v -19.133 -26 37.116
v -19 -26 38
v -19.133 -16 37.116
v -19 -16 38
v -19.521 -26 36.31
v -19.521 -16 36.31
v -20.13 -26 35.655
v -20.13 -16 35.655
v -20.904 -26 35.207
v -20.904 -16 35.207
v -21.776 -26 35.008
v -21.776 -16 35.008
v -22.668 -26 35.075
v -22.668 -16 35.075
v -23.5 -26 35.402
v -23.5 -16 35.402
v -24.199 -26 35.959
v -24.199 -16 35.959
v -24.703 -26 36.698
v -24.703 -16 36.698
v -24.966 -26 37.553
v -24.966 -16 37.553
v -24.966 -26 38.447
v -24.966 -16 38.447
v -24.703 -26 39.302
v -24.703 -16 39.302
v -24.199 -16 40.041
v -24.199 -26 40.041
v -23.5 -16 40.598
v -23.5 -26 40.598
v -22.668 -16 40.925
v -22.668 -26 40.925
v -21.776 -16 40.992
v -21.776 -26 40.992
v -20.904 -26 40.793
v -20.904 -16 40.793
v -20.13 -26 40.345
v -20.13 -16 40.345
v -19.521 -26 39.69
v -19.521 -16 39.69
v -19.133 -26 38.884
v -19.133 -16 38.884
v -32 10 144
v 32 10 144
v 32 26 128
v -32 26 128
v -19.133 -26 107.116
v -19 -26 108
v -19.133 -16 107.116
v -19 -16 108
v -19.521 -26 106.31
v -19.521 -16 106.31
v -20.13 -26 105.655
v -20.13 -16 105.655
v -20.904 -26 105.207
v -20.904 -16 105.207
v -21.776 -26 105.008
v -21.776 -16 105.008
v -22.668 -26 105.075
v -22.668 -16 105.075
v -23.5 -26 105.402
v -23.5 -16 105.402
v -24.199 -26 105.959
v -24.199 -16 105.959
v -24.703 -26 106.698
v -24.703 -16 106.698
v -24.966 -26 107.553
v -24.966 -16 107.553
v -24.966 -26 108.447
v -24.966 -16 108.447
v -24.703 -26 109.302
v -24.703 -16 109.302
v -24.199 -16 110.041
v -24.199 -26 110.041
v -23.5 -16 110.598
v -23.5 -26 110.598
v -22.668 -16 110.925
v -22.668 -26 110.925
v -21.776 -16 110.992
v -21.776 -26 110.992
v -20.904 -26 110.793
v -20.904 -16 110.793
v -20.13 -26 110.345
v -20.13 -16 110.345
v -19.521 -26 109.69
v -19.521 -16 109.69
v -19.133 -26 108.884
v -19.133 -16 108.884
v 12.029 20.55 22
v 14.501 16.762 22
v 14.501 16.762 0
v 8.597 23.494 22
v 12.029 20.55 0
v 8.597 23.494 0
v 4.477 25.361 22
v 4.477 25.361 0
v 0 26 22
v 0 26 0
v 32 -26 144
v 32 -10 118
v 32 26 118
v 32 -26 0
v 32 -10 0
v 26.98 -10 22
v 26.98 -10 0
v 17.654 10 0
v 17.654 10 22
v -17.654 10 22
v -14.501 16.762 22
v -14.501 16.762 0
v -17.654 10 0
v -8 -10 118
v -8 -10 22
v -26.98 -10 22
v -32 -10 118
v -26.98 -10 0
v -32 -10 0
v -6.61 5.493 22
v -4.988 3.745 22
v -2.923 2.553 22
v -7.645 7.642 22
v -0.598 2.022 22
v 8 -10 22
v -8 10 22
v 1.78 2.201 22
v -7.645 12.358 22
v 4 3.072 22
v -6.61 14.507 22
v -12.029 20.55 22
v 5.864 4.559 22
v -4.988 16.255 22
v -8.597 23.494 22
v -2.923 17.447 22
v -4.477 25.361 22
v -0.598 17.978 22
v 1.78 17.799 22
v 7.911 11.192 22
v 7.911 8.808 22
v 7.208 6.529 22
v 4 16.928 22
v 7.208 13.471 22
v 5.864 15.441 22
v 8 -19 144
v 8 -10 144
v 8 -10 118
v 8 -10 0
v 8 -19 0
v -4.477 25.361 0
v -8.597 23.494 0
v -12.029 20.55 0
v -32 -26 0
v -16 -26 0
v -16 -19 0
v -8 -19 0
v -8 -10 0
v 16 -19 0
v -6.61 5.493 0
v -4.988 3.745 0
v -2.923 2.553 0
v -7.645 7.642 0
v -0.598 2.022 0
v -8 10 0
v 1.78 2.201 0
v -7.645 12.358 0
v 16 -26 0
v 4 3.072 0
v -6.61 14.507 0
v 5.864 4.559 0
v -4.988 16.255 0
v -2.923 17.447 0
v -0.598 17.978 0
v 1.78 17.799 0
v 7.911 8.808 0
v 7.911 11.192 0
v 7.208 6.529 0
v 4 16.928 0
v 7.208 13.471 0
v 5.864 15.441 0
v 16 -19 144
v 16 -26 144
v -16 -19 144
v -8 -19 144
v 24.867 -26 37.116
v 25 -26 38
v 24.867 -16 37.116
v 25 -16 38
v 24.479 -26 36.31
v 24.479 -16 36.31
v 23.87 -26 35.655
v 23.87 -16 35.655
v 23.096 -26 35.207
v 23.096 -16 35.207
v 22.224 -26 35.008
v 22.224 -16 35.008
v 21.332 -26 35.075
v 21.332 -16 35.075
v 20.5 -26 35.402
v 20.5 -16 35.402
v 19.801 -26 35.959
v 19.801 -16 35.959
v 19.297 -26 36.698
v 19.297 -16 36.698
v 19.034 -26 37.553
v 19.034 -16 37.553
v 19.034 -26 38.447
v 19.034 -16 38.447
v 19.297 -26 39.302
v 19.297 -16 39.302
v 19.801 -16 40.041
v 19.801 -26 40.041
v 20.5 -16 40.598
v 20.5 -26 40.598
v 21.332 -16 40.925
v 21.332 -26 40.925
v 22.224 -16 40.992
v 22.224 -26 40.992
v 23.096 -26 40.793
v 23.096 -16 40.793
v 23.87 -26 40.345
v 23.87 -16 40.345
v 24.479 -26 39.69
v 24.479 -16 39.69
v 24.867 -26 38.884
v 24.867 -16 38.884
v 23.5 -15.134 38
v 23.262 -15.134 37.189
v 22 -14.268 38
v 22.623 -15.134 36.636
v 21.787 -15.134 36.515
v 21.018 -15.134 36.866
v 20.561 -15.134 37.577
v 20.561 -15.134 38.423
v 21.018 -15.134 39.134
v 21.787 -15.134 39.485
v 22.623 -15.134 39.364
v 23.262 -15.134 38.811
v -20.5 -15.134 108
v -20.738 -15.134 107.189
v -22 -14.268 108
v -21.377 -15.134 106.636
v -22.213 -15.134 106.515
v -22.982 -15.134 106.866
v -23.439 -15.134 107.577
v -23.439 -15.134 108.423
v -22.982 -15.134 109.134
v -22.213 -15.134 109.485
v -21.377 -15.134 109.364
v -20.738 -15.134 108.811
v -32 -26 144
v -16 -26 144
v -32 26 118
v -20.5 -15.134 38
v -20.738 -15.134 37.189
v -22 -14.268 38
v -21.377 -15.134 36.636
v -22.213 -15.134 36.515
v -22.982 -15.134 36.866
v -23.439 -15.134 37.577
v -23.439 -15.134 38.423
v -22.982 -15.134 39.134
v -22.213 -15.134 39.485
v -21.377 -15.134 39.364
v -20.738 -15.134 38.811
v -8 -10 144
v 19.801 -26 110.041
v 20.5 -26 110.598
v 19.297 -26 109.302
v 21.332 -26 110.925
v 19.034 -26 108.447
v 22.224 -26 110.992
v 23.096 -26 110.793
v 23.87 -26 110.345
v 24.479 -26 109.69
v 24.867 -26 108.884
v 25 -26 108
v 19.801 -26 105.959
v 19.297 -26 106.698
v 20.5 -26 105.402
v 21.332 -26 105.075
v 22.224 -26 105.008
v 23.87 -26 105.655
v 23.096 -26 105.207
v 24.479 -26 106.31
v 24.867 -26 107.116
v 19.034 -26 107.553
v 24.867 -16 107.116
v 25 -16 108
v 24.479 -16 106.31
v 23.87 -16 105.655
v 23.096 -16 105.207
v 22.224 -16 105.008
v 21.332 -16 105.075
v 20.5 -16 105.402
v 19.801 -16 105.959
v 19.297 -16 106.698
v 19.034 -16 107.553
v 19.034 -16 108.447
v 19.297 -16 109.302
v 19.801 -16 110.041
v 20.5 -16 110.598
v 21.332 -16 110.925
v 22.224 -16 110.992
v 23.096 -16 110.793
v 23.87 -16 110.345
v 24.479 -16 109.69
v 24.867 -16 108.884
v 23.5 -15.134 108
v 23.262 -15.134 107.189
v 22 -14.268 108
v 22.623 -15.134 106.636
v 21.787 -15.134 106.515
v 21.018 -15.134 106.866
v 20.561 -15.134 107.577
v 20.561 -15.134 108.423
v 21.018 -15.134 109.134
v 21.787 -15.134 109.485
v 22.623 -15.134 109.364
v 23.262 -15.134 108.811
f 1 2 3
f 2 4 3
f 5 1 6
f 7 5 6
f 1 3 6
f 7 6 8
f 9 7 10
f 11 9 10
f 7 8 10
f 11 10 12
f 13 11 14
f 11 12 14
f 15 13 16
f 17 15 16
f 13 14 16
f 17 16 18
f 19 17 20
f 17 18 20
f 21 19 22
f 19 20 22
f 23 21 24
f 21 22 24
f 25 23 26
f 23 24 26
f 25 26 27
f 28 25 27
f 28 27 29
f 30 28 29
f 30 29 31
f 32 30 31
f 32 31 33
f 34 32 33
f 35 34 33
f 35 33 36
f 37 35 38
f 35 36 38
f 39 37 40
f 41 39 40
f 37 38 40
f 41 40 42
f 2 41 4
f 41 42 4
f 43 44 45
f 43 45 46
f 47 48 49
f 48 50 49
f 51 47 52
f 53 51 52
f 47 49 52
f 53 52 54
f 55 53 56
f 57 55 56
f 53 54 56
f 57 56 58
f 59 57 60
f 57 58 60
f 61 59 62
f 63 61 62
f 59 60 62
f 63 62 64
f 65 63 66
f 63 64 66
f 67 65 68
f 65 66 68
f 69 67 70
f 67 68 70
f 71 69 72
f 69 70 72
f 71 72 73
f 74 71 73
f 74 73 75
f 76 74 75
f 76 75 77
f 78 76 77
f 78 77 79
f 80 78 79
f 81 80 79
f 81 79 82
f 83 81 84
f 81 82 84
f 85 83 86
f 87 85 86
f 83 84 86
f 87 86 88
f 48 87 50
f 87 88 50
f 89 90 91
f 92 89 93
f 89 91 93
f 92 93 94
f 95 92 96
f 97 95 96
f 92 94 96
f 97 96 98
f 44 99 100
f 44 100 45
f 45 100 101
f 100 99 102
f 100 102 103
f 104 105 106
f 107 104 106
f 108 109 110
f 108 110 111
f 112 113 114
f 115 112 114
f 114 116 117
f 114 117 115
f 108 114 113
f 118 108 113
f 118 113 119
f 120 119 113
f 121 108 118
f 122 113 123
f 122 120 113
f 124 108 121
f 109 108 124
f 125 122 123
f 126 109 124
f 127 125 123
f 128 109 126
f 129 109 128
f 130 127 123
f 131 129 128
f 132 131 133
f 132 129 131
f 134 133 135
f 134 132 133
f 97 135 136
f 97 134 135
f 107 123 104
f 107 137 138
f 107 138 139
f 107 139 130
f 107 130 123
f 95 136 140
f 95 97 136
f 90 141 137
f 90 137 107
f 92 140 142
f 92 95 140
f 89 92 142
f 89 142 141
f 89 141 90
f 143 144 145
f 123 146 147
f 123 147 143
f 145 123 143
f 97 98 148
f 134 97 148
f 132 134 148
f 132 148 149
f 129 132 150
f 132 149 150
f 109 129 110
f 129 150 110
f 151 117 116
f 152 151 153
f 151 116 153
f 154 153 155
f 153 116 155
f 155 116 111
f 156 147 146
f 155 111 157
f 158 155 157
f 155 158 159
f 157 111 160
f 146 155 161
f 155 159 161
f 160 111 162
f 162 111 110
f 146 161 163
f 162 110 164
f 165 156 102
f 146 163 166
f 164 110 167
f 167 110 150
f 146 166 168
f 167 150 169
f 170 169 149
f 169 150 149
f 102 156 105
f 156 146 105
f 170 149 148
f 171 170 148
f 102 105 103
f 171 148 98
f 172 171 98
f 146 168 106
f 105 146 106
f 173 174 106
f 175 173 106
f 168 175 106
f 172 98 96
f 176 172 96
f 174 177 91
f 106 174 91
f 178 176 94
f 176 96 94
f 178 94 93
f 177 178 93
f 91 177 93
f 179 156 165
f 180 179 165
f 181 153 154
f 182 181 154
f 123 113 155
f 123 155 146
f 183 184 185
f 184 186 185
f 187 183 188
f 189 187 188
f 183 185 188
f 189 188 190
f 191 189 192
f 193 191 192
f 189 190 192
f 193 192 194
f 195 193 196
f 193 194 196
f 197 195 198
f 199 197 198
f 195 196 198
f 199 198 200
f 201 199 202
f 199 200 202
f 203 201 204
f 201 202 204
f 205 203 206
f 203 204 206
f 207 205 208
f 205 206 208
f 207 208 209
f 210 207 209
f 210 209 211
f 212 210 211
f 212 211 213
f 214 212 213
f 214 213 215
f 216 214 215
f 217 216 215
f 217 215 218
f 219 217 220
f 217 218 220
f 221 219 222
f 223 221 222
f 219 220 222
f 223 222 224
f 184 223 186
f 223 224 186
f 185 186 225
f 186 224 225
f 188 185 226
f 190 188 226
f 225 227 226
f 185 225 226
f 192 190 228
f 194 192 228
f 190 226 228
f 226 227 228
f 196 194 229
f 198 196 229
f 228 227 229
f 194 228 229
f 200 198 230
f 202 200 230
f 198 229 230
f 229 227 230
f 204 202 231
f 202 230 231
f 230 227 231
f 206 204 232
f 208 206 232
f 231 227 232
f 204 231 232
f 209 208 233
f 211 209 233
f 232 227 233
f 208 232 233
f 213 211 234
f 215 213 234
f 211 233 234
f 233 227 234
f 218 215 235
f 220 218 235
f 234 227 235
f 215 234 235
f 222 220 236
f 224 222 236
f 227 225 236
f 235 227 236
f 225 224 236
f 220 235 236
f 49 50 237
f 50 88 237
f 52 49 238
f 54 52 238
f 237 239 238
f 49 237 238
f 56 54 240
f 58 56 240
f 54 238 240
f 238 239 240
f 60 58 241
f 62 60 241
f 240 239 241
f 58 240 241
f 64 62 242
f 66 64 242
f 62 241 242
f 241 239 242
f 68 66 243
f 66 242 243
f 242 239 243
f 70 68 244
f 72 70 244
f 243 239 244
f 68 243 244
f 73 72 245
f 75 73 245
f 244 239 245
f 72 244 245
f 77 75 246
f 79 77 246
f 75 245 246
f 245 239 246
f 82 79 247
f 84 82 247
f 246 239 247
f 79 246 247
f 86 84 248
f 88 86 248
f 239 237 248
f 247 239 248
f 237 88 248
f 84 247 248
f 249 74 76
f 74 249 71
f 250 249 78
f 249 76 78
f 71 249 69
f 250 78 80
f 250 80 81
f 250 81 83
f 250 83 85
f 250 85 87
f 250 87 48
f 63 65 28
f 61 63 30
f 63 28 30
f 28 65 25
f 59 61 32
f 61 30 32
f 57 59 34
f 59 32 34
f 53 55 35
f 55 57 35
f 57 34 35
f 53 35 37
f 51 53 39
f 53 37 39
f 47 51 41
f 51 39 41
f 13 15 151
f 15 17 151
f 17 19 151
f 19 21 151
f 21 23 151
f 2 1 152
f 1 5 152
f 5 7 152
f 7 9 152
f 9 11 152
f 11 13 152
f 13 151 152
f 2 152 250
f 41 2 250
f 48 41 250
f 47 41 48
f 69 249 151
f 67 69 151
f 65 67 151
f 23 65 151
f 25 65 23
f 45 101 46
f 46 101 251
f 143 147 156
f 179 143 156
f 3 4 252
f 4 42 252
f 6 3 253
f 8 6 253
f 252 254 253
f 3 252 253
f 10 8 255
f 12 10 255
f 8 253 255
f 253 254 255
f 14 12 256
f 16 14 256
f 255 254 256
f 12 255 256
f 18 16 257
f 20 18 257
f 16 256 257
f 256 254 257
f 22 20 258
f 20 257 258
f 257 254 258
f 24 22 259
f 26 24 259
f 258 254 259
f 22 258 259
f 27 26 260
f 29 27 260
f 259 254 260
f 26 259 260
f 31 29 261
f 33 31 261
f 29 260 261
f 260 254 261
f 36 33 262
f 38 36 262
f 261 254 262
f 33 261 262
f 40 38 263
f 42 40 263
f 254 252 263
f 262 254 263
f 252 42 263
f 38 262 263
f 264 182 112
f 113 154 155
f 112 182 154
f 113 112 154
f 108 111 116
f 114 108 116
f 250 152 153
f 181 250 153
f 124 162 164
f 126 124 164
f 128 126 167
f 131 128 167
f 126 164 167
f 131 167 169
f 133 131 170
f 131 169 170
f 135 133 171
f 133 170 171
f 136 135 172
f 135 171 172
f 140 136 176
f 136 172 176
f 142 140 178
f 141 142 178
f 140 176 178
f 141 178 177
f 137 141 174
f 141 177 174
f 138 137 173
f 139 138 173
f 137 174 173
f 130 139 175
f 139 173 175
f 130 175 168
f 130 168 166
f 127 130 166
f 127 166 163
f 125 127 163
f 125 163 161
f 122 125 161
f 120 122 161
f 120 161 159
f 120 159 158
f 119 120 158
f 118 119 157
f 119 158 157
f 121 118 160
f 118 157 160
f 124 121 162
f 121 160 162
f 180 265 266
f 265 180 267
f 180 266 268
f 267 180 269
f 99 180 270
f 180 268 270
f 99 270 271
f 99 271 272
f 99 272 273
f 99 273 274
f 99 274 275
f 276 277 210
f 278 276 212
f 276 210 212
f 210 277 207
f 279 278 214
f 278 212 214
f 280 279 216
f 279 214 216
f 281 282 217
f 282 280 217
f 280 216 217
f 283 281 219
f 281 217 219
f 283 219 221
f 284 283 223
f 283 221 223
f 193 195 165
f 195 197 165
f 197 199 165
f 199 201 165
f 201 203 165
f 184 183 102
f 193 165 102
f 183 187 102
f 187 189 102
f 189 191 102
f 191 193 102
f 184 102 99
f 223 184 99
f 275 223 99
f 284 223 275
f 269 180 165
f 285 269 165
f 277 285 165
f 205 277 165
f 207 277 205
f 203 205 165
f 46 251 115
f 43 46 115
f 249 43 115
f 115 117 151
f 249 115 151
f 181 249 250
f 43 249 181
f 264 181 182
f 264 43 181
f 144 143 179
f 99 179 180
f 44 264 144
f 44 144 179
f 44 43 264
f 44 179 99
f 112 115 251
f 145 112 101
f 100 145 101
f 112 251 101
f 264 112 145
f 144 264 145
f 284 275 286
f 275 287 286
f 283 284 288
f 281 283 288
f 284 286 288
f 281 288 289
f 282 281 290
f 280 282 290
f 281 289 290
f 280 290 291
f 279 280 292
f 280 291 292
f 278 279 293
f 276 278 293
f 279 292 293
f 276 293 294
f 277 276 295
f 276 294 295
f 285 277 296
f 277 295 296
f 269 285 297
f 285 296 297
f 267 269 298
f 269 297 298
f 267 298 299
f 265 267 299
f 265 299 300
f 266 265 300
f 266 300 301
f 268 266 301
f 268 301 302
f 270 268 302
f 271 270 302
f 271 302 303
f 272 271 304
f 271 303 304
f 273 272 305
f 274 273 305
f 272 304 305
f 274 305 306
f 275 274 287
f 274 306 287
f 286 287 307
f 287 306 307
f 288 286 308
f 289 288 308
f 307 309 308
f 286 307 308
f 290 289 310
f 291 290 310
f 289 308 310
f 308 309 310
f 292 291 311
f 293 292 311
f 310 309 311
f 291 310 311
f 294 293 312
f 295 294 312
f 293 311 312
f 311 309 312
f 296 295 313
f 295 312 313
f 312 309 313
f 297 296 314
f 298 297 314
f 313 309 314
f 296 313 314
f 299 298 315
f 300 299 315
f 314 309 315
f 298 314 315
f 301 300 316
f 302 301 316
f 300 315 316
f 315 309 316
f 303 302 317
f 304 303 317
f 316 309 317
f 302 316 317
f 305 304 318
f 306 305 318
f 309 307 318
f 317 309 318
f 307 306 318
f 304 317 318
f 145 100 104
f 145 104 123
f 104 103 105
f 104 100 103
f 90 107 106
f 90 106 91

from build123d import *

# Parameters (mm, degrees)
BOSS_EXTRUDE2_DEPTH   = 144
BOSS_EXTRUDE2_2_DEPTH = 144
BOSS_EXTRUDE3_START   = 118
BOSS_EXTRUDE3_DEPTH   = 26
BOSS_EXTRUDE4_DEPTH   = 22
CHAMFER1_SIZE         = 16


# Read off the part's stored shape, not the designer's step: Ø2.0 (6) Diameter Hole1
with BuildPart() as part:
    # Sketch1 → Boss-Extrude2 (new body)
    with BuildSketch(Plane.XY):
        Polygon((26.980199866, -10), (8, -10), (8, -19), (16, -19), (16, -26), (32, -26), (32, -10), align=None)
    extrude(amount=BOSS_EXTRUDE2_DEPTH)



with BuildPart() as body_2:
    # Sketch1 → Boss-Extrude2 2 (new body)
    with BuildSketch(Plane.XY):
        Polygon((-32, -10), (-32, -26), (-16, -26), (-16, -19), (-8, -19), (-8, -10), (-26.980199866, -10), align=None)
    extrude(amount=BOSS_EXTRUDE2_2_DEPTH)


with BuildPart() as part_1:
    add(part.part)

    add(body_2.part)  # Boss-Extrude3 merges body 2
    # Sketch1<5> → Boss-Extrude3 (add)
    with BuildSketch(Plane.XY.offset(BOSS_EXTRUDE3_START)):
        Polygon((17.654046703, 10), (26.980199866, -10), (32, -10), (32, 10), align=None)
        with BuildLine():
            Line((32, 26), (-2.1e-08, 26))
            ThreePointArc((-2.1e-08, 26), (8.596793725, 23.494263139), (14.500924593, 16.761892188))
            Line((14.500924593, 16.761892188), (17.654046703, 10))
            Line((17.654046703, 10), (32, 10))
            Line((32, 10), (32, 26))
        make_face()
        with BuildLine():
            Line((-32, 26), (-32, 10))
            Line((-32, 10), (-17.654046703, 10))
            Line((-17.654046703, 10), (-14.500924593, 16.761892188))
            ThreePointArc((-14.500924593, 16.761892188), (-8.596793742, 23.494263127), (-2.1e-08, 26))
            Line((-2.1e-08, 26), (-32, 26))
        make_face()
        with BuildLine():
            Line((-14.500924593, 16.761892188), (-17.654046703, 10))
            Line((-17.654046703, 10), (-8, 10))
            ThreePointArc((-8, 10), (0, 18), (8, 10))
            Line((8, 10), (17.654046703, 10))
            Line((17.654046703, 10), (14.500924593, 16.761892188))
            ThreePointArc((14.500924593, 16.761892188), (8.596793725, 23.494263139), (-2.1e-08, 26))
            ThreePointArc((-2.1e-08, 26), (-8.596793742, 23.494263127), (-14.500924593, 16.761892188))
        make_face()
        with BuildLine():
            Line((-17.654046703, 10), (-26.980199866, -10))
            Line((-26.980199866, -10), (-8, -10))
            Line((-8, -10), (8, -10))
            Line((8, -10), (26.980199866, -10))
            Line((26.980199866, -10), (17.654046703, 10))
            Line((17.654046703, 10), (8, 10))
            ThreePointArc((8, 10), (0, 2), (-8, 10))
            Line((-8, 10), (-17.654046703, 10))
        make_face()
        with BuildLine():
            ThreePointArc((8, 10), (0, 18), (-8, 10))
            Line((-8, 10), (8, 10))
        make_face()
        with BuildLine():
            Line((8, 10), (-8, 10))
            ThreePointArc((-8, 10), (0, 2), (8, 10))
        make_face()
        Polygon((-32, 10), (-32, -10), (-26.980199866, -10), (-17.654046703, 10), align=None)
        Polygon((-32, -10), (-32, -26), (-16, -26), (-16, -19), (-8, -19), (-8, -10), (-26.980199866, -10), align=None)
        Polygon((26.980199866, -10), (8, -10), (8, -19), (16, -19), (16, -26), (32, -26), (32, -10), align=None)
    extrude(amount=BOSS_EXTRUDE3_DEPTH)

    # Sketch1<6> → Boss-Extrude4 (add)
    with BuildSketch(Plane.XY):
        with BuildLine():
            Line((-17.654046703, 10), (-26.980199866, -10))
            Line((-26.980199866, -10), (-8, -10))
            Line((-8, -10), (8, -10))
            Line((8, -10), (26.980199866, -10))
            Line((26.980199866, -10), (17.654046703, 10))
            Line((17.654046703, 10), (8, 10))
            ThreePointArc((8, 10), (0, 2), (-8, 10))
            Line((-8, 10), (-17.654046703, 10))
        make_face()
        with BuildLine():
            Line((-14.500924593, 16.761892188), (-17.654046703, 10))
            Line((-17.654046703, 10), (-8, 10))
            ThreePointArc((-8, 10), (0, 18), (8, 10))
            Line((8, 10), (17.654046703, 10))
            Line((17.654046703, 10), (14.500924593, 16.761892188))
            ThreePointArc((14.500924593, 16.761892188), (8.596793725, 23.494263139), (-2.1e-08, 26))
            ThreePointArc((-2.1e-08, 26), (-8.596793742, 23.494263127), (-14.500924593, 16.761892188))
        make_face()
    extrude(amount=BOSS_EXTRUDE4_DEPTH)

    # Chamfer1
    chamfer1_edges = [part_1.edges().sort_by_distance(p)[0] for p in [
        (0, 26, 144),
    ]]
    chamfer(chamfer1_edges, length=CHAMFER1_SIZE)

    # Ø2.0 (6) Diameter Hole1 outline → Ø2.0 (6) Diameter Hole1 (revolve, cut)
    with BuildSketch(Plane(origin=(-22, 0, 38), x_dir=(1, 0, 0), z_dir=(0, 0, 1))):
        Polygon((3, -16), (0, -14.267949192), (0, -26), (3, -26), align=None)
    revolve(axis=Axis((-22, 0, 38), (0, 1, 0)), mode=Mode.SUBTRACT)

    # 2.0 _6_ Diameter Hole1 2 outline → 2.0 _6_ Diameter Hole1 2 (revolve, cut)
    with BuildSketch(Plane(origin=(22, 0, 108), x_dir=(1, 0, 0), z_dir=(0, 0, 1))):
        Polygon((3, -16), (0, -14.267949192), (0, -26), (3, -26), align=None)
    revolve(axis=Axis((22, 0, 108), (0, 1, 0)), mode=Mode.SUBTRACT)

    # 2.0 _6_ Diameter Hole1 3 outline → 2.0 _6_ Diameter Hole1 3 (revolve, cut)
    with BuildSketch(Plane(origin=(-22, 0, 108), x_dir=(1, 0, 0), z_dir=(0, 0, 1))):
        Polygon((3, -16), (0, -14.267949192), (0, -26), (3, -26), align=None)
    revolve(axis=Axis((-22, 0, 108), (0, 1, 0)), mode=Mode.SUBTRACT)

    # 2.0 _6_ Diameter Hole1 4 outline → 2.0 _6_ Diameter Hole1 4 (revolve, cut)
    with BuildSketch(Plane(origin=(22, 0, 38), x_dir=(1, 0, 0), z_dir=(0, 0, 1))):
        Polygon((3, -16), (0, -14.267949192), (0, -26), (3, -26), align=None)
    revolve(axis=Axis((22, 0, 38), (0, 1, 0)), mode=Mode.SUBTRACT)


solid = part_1.part
